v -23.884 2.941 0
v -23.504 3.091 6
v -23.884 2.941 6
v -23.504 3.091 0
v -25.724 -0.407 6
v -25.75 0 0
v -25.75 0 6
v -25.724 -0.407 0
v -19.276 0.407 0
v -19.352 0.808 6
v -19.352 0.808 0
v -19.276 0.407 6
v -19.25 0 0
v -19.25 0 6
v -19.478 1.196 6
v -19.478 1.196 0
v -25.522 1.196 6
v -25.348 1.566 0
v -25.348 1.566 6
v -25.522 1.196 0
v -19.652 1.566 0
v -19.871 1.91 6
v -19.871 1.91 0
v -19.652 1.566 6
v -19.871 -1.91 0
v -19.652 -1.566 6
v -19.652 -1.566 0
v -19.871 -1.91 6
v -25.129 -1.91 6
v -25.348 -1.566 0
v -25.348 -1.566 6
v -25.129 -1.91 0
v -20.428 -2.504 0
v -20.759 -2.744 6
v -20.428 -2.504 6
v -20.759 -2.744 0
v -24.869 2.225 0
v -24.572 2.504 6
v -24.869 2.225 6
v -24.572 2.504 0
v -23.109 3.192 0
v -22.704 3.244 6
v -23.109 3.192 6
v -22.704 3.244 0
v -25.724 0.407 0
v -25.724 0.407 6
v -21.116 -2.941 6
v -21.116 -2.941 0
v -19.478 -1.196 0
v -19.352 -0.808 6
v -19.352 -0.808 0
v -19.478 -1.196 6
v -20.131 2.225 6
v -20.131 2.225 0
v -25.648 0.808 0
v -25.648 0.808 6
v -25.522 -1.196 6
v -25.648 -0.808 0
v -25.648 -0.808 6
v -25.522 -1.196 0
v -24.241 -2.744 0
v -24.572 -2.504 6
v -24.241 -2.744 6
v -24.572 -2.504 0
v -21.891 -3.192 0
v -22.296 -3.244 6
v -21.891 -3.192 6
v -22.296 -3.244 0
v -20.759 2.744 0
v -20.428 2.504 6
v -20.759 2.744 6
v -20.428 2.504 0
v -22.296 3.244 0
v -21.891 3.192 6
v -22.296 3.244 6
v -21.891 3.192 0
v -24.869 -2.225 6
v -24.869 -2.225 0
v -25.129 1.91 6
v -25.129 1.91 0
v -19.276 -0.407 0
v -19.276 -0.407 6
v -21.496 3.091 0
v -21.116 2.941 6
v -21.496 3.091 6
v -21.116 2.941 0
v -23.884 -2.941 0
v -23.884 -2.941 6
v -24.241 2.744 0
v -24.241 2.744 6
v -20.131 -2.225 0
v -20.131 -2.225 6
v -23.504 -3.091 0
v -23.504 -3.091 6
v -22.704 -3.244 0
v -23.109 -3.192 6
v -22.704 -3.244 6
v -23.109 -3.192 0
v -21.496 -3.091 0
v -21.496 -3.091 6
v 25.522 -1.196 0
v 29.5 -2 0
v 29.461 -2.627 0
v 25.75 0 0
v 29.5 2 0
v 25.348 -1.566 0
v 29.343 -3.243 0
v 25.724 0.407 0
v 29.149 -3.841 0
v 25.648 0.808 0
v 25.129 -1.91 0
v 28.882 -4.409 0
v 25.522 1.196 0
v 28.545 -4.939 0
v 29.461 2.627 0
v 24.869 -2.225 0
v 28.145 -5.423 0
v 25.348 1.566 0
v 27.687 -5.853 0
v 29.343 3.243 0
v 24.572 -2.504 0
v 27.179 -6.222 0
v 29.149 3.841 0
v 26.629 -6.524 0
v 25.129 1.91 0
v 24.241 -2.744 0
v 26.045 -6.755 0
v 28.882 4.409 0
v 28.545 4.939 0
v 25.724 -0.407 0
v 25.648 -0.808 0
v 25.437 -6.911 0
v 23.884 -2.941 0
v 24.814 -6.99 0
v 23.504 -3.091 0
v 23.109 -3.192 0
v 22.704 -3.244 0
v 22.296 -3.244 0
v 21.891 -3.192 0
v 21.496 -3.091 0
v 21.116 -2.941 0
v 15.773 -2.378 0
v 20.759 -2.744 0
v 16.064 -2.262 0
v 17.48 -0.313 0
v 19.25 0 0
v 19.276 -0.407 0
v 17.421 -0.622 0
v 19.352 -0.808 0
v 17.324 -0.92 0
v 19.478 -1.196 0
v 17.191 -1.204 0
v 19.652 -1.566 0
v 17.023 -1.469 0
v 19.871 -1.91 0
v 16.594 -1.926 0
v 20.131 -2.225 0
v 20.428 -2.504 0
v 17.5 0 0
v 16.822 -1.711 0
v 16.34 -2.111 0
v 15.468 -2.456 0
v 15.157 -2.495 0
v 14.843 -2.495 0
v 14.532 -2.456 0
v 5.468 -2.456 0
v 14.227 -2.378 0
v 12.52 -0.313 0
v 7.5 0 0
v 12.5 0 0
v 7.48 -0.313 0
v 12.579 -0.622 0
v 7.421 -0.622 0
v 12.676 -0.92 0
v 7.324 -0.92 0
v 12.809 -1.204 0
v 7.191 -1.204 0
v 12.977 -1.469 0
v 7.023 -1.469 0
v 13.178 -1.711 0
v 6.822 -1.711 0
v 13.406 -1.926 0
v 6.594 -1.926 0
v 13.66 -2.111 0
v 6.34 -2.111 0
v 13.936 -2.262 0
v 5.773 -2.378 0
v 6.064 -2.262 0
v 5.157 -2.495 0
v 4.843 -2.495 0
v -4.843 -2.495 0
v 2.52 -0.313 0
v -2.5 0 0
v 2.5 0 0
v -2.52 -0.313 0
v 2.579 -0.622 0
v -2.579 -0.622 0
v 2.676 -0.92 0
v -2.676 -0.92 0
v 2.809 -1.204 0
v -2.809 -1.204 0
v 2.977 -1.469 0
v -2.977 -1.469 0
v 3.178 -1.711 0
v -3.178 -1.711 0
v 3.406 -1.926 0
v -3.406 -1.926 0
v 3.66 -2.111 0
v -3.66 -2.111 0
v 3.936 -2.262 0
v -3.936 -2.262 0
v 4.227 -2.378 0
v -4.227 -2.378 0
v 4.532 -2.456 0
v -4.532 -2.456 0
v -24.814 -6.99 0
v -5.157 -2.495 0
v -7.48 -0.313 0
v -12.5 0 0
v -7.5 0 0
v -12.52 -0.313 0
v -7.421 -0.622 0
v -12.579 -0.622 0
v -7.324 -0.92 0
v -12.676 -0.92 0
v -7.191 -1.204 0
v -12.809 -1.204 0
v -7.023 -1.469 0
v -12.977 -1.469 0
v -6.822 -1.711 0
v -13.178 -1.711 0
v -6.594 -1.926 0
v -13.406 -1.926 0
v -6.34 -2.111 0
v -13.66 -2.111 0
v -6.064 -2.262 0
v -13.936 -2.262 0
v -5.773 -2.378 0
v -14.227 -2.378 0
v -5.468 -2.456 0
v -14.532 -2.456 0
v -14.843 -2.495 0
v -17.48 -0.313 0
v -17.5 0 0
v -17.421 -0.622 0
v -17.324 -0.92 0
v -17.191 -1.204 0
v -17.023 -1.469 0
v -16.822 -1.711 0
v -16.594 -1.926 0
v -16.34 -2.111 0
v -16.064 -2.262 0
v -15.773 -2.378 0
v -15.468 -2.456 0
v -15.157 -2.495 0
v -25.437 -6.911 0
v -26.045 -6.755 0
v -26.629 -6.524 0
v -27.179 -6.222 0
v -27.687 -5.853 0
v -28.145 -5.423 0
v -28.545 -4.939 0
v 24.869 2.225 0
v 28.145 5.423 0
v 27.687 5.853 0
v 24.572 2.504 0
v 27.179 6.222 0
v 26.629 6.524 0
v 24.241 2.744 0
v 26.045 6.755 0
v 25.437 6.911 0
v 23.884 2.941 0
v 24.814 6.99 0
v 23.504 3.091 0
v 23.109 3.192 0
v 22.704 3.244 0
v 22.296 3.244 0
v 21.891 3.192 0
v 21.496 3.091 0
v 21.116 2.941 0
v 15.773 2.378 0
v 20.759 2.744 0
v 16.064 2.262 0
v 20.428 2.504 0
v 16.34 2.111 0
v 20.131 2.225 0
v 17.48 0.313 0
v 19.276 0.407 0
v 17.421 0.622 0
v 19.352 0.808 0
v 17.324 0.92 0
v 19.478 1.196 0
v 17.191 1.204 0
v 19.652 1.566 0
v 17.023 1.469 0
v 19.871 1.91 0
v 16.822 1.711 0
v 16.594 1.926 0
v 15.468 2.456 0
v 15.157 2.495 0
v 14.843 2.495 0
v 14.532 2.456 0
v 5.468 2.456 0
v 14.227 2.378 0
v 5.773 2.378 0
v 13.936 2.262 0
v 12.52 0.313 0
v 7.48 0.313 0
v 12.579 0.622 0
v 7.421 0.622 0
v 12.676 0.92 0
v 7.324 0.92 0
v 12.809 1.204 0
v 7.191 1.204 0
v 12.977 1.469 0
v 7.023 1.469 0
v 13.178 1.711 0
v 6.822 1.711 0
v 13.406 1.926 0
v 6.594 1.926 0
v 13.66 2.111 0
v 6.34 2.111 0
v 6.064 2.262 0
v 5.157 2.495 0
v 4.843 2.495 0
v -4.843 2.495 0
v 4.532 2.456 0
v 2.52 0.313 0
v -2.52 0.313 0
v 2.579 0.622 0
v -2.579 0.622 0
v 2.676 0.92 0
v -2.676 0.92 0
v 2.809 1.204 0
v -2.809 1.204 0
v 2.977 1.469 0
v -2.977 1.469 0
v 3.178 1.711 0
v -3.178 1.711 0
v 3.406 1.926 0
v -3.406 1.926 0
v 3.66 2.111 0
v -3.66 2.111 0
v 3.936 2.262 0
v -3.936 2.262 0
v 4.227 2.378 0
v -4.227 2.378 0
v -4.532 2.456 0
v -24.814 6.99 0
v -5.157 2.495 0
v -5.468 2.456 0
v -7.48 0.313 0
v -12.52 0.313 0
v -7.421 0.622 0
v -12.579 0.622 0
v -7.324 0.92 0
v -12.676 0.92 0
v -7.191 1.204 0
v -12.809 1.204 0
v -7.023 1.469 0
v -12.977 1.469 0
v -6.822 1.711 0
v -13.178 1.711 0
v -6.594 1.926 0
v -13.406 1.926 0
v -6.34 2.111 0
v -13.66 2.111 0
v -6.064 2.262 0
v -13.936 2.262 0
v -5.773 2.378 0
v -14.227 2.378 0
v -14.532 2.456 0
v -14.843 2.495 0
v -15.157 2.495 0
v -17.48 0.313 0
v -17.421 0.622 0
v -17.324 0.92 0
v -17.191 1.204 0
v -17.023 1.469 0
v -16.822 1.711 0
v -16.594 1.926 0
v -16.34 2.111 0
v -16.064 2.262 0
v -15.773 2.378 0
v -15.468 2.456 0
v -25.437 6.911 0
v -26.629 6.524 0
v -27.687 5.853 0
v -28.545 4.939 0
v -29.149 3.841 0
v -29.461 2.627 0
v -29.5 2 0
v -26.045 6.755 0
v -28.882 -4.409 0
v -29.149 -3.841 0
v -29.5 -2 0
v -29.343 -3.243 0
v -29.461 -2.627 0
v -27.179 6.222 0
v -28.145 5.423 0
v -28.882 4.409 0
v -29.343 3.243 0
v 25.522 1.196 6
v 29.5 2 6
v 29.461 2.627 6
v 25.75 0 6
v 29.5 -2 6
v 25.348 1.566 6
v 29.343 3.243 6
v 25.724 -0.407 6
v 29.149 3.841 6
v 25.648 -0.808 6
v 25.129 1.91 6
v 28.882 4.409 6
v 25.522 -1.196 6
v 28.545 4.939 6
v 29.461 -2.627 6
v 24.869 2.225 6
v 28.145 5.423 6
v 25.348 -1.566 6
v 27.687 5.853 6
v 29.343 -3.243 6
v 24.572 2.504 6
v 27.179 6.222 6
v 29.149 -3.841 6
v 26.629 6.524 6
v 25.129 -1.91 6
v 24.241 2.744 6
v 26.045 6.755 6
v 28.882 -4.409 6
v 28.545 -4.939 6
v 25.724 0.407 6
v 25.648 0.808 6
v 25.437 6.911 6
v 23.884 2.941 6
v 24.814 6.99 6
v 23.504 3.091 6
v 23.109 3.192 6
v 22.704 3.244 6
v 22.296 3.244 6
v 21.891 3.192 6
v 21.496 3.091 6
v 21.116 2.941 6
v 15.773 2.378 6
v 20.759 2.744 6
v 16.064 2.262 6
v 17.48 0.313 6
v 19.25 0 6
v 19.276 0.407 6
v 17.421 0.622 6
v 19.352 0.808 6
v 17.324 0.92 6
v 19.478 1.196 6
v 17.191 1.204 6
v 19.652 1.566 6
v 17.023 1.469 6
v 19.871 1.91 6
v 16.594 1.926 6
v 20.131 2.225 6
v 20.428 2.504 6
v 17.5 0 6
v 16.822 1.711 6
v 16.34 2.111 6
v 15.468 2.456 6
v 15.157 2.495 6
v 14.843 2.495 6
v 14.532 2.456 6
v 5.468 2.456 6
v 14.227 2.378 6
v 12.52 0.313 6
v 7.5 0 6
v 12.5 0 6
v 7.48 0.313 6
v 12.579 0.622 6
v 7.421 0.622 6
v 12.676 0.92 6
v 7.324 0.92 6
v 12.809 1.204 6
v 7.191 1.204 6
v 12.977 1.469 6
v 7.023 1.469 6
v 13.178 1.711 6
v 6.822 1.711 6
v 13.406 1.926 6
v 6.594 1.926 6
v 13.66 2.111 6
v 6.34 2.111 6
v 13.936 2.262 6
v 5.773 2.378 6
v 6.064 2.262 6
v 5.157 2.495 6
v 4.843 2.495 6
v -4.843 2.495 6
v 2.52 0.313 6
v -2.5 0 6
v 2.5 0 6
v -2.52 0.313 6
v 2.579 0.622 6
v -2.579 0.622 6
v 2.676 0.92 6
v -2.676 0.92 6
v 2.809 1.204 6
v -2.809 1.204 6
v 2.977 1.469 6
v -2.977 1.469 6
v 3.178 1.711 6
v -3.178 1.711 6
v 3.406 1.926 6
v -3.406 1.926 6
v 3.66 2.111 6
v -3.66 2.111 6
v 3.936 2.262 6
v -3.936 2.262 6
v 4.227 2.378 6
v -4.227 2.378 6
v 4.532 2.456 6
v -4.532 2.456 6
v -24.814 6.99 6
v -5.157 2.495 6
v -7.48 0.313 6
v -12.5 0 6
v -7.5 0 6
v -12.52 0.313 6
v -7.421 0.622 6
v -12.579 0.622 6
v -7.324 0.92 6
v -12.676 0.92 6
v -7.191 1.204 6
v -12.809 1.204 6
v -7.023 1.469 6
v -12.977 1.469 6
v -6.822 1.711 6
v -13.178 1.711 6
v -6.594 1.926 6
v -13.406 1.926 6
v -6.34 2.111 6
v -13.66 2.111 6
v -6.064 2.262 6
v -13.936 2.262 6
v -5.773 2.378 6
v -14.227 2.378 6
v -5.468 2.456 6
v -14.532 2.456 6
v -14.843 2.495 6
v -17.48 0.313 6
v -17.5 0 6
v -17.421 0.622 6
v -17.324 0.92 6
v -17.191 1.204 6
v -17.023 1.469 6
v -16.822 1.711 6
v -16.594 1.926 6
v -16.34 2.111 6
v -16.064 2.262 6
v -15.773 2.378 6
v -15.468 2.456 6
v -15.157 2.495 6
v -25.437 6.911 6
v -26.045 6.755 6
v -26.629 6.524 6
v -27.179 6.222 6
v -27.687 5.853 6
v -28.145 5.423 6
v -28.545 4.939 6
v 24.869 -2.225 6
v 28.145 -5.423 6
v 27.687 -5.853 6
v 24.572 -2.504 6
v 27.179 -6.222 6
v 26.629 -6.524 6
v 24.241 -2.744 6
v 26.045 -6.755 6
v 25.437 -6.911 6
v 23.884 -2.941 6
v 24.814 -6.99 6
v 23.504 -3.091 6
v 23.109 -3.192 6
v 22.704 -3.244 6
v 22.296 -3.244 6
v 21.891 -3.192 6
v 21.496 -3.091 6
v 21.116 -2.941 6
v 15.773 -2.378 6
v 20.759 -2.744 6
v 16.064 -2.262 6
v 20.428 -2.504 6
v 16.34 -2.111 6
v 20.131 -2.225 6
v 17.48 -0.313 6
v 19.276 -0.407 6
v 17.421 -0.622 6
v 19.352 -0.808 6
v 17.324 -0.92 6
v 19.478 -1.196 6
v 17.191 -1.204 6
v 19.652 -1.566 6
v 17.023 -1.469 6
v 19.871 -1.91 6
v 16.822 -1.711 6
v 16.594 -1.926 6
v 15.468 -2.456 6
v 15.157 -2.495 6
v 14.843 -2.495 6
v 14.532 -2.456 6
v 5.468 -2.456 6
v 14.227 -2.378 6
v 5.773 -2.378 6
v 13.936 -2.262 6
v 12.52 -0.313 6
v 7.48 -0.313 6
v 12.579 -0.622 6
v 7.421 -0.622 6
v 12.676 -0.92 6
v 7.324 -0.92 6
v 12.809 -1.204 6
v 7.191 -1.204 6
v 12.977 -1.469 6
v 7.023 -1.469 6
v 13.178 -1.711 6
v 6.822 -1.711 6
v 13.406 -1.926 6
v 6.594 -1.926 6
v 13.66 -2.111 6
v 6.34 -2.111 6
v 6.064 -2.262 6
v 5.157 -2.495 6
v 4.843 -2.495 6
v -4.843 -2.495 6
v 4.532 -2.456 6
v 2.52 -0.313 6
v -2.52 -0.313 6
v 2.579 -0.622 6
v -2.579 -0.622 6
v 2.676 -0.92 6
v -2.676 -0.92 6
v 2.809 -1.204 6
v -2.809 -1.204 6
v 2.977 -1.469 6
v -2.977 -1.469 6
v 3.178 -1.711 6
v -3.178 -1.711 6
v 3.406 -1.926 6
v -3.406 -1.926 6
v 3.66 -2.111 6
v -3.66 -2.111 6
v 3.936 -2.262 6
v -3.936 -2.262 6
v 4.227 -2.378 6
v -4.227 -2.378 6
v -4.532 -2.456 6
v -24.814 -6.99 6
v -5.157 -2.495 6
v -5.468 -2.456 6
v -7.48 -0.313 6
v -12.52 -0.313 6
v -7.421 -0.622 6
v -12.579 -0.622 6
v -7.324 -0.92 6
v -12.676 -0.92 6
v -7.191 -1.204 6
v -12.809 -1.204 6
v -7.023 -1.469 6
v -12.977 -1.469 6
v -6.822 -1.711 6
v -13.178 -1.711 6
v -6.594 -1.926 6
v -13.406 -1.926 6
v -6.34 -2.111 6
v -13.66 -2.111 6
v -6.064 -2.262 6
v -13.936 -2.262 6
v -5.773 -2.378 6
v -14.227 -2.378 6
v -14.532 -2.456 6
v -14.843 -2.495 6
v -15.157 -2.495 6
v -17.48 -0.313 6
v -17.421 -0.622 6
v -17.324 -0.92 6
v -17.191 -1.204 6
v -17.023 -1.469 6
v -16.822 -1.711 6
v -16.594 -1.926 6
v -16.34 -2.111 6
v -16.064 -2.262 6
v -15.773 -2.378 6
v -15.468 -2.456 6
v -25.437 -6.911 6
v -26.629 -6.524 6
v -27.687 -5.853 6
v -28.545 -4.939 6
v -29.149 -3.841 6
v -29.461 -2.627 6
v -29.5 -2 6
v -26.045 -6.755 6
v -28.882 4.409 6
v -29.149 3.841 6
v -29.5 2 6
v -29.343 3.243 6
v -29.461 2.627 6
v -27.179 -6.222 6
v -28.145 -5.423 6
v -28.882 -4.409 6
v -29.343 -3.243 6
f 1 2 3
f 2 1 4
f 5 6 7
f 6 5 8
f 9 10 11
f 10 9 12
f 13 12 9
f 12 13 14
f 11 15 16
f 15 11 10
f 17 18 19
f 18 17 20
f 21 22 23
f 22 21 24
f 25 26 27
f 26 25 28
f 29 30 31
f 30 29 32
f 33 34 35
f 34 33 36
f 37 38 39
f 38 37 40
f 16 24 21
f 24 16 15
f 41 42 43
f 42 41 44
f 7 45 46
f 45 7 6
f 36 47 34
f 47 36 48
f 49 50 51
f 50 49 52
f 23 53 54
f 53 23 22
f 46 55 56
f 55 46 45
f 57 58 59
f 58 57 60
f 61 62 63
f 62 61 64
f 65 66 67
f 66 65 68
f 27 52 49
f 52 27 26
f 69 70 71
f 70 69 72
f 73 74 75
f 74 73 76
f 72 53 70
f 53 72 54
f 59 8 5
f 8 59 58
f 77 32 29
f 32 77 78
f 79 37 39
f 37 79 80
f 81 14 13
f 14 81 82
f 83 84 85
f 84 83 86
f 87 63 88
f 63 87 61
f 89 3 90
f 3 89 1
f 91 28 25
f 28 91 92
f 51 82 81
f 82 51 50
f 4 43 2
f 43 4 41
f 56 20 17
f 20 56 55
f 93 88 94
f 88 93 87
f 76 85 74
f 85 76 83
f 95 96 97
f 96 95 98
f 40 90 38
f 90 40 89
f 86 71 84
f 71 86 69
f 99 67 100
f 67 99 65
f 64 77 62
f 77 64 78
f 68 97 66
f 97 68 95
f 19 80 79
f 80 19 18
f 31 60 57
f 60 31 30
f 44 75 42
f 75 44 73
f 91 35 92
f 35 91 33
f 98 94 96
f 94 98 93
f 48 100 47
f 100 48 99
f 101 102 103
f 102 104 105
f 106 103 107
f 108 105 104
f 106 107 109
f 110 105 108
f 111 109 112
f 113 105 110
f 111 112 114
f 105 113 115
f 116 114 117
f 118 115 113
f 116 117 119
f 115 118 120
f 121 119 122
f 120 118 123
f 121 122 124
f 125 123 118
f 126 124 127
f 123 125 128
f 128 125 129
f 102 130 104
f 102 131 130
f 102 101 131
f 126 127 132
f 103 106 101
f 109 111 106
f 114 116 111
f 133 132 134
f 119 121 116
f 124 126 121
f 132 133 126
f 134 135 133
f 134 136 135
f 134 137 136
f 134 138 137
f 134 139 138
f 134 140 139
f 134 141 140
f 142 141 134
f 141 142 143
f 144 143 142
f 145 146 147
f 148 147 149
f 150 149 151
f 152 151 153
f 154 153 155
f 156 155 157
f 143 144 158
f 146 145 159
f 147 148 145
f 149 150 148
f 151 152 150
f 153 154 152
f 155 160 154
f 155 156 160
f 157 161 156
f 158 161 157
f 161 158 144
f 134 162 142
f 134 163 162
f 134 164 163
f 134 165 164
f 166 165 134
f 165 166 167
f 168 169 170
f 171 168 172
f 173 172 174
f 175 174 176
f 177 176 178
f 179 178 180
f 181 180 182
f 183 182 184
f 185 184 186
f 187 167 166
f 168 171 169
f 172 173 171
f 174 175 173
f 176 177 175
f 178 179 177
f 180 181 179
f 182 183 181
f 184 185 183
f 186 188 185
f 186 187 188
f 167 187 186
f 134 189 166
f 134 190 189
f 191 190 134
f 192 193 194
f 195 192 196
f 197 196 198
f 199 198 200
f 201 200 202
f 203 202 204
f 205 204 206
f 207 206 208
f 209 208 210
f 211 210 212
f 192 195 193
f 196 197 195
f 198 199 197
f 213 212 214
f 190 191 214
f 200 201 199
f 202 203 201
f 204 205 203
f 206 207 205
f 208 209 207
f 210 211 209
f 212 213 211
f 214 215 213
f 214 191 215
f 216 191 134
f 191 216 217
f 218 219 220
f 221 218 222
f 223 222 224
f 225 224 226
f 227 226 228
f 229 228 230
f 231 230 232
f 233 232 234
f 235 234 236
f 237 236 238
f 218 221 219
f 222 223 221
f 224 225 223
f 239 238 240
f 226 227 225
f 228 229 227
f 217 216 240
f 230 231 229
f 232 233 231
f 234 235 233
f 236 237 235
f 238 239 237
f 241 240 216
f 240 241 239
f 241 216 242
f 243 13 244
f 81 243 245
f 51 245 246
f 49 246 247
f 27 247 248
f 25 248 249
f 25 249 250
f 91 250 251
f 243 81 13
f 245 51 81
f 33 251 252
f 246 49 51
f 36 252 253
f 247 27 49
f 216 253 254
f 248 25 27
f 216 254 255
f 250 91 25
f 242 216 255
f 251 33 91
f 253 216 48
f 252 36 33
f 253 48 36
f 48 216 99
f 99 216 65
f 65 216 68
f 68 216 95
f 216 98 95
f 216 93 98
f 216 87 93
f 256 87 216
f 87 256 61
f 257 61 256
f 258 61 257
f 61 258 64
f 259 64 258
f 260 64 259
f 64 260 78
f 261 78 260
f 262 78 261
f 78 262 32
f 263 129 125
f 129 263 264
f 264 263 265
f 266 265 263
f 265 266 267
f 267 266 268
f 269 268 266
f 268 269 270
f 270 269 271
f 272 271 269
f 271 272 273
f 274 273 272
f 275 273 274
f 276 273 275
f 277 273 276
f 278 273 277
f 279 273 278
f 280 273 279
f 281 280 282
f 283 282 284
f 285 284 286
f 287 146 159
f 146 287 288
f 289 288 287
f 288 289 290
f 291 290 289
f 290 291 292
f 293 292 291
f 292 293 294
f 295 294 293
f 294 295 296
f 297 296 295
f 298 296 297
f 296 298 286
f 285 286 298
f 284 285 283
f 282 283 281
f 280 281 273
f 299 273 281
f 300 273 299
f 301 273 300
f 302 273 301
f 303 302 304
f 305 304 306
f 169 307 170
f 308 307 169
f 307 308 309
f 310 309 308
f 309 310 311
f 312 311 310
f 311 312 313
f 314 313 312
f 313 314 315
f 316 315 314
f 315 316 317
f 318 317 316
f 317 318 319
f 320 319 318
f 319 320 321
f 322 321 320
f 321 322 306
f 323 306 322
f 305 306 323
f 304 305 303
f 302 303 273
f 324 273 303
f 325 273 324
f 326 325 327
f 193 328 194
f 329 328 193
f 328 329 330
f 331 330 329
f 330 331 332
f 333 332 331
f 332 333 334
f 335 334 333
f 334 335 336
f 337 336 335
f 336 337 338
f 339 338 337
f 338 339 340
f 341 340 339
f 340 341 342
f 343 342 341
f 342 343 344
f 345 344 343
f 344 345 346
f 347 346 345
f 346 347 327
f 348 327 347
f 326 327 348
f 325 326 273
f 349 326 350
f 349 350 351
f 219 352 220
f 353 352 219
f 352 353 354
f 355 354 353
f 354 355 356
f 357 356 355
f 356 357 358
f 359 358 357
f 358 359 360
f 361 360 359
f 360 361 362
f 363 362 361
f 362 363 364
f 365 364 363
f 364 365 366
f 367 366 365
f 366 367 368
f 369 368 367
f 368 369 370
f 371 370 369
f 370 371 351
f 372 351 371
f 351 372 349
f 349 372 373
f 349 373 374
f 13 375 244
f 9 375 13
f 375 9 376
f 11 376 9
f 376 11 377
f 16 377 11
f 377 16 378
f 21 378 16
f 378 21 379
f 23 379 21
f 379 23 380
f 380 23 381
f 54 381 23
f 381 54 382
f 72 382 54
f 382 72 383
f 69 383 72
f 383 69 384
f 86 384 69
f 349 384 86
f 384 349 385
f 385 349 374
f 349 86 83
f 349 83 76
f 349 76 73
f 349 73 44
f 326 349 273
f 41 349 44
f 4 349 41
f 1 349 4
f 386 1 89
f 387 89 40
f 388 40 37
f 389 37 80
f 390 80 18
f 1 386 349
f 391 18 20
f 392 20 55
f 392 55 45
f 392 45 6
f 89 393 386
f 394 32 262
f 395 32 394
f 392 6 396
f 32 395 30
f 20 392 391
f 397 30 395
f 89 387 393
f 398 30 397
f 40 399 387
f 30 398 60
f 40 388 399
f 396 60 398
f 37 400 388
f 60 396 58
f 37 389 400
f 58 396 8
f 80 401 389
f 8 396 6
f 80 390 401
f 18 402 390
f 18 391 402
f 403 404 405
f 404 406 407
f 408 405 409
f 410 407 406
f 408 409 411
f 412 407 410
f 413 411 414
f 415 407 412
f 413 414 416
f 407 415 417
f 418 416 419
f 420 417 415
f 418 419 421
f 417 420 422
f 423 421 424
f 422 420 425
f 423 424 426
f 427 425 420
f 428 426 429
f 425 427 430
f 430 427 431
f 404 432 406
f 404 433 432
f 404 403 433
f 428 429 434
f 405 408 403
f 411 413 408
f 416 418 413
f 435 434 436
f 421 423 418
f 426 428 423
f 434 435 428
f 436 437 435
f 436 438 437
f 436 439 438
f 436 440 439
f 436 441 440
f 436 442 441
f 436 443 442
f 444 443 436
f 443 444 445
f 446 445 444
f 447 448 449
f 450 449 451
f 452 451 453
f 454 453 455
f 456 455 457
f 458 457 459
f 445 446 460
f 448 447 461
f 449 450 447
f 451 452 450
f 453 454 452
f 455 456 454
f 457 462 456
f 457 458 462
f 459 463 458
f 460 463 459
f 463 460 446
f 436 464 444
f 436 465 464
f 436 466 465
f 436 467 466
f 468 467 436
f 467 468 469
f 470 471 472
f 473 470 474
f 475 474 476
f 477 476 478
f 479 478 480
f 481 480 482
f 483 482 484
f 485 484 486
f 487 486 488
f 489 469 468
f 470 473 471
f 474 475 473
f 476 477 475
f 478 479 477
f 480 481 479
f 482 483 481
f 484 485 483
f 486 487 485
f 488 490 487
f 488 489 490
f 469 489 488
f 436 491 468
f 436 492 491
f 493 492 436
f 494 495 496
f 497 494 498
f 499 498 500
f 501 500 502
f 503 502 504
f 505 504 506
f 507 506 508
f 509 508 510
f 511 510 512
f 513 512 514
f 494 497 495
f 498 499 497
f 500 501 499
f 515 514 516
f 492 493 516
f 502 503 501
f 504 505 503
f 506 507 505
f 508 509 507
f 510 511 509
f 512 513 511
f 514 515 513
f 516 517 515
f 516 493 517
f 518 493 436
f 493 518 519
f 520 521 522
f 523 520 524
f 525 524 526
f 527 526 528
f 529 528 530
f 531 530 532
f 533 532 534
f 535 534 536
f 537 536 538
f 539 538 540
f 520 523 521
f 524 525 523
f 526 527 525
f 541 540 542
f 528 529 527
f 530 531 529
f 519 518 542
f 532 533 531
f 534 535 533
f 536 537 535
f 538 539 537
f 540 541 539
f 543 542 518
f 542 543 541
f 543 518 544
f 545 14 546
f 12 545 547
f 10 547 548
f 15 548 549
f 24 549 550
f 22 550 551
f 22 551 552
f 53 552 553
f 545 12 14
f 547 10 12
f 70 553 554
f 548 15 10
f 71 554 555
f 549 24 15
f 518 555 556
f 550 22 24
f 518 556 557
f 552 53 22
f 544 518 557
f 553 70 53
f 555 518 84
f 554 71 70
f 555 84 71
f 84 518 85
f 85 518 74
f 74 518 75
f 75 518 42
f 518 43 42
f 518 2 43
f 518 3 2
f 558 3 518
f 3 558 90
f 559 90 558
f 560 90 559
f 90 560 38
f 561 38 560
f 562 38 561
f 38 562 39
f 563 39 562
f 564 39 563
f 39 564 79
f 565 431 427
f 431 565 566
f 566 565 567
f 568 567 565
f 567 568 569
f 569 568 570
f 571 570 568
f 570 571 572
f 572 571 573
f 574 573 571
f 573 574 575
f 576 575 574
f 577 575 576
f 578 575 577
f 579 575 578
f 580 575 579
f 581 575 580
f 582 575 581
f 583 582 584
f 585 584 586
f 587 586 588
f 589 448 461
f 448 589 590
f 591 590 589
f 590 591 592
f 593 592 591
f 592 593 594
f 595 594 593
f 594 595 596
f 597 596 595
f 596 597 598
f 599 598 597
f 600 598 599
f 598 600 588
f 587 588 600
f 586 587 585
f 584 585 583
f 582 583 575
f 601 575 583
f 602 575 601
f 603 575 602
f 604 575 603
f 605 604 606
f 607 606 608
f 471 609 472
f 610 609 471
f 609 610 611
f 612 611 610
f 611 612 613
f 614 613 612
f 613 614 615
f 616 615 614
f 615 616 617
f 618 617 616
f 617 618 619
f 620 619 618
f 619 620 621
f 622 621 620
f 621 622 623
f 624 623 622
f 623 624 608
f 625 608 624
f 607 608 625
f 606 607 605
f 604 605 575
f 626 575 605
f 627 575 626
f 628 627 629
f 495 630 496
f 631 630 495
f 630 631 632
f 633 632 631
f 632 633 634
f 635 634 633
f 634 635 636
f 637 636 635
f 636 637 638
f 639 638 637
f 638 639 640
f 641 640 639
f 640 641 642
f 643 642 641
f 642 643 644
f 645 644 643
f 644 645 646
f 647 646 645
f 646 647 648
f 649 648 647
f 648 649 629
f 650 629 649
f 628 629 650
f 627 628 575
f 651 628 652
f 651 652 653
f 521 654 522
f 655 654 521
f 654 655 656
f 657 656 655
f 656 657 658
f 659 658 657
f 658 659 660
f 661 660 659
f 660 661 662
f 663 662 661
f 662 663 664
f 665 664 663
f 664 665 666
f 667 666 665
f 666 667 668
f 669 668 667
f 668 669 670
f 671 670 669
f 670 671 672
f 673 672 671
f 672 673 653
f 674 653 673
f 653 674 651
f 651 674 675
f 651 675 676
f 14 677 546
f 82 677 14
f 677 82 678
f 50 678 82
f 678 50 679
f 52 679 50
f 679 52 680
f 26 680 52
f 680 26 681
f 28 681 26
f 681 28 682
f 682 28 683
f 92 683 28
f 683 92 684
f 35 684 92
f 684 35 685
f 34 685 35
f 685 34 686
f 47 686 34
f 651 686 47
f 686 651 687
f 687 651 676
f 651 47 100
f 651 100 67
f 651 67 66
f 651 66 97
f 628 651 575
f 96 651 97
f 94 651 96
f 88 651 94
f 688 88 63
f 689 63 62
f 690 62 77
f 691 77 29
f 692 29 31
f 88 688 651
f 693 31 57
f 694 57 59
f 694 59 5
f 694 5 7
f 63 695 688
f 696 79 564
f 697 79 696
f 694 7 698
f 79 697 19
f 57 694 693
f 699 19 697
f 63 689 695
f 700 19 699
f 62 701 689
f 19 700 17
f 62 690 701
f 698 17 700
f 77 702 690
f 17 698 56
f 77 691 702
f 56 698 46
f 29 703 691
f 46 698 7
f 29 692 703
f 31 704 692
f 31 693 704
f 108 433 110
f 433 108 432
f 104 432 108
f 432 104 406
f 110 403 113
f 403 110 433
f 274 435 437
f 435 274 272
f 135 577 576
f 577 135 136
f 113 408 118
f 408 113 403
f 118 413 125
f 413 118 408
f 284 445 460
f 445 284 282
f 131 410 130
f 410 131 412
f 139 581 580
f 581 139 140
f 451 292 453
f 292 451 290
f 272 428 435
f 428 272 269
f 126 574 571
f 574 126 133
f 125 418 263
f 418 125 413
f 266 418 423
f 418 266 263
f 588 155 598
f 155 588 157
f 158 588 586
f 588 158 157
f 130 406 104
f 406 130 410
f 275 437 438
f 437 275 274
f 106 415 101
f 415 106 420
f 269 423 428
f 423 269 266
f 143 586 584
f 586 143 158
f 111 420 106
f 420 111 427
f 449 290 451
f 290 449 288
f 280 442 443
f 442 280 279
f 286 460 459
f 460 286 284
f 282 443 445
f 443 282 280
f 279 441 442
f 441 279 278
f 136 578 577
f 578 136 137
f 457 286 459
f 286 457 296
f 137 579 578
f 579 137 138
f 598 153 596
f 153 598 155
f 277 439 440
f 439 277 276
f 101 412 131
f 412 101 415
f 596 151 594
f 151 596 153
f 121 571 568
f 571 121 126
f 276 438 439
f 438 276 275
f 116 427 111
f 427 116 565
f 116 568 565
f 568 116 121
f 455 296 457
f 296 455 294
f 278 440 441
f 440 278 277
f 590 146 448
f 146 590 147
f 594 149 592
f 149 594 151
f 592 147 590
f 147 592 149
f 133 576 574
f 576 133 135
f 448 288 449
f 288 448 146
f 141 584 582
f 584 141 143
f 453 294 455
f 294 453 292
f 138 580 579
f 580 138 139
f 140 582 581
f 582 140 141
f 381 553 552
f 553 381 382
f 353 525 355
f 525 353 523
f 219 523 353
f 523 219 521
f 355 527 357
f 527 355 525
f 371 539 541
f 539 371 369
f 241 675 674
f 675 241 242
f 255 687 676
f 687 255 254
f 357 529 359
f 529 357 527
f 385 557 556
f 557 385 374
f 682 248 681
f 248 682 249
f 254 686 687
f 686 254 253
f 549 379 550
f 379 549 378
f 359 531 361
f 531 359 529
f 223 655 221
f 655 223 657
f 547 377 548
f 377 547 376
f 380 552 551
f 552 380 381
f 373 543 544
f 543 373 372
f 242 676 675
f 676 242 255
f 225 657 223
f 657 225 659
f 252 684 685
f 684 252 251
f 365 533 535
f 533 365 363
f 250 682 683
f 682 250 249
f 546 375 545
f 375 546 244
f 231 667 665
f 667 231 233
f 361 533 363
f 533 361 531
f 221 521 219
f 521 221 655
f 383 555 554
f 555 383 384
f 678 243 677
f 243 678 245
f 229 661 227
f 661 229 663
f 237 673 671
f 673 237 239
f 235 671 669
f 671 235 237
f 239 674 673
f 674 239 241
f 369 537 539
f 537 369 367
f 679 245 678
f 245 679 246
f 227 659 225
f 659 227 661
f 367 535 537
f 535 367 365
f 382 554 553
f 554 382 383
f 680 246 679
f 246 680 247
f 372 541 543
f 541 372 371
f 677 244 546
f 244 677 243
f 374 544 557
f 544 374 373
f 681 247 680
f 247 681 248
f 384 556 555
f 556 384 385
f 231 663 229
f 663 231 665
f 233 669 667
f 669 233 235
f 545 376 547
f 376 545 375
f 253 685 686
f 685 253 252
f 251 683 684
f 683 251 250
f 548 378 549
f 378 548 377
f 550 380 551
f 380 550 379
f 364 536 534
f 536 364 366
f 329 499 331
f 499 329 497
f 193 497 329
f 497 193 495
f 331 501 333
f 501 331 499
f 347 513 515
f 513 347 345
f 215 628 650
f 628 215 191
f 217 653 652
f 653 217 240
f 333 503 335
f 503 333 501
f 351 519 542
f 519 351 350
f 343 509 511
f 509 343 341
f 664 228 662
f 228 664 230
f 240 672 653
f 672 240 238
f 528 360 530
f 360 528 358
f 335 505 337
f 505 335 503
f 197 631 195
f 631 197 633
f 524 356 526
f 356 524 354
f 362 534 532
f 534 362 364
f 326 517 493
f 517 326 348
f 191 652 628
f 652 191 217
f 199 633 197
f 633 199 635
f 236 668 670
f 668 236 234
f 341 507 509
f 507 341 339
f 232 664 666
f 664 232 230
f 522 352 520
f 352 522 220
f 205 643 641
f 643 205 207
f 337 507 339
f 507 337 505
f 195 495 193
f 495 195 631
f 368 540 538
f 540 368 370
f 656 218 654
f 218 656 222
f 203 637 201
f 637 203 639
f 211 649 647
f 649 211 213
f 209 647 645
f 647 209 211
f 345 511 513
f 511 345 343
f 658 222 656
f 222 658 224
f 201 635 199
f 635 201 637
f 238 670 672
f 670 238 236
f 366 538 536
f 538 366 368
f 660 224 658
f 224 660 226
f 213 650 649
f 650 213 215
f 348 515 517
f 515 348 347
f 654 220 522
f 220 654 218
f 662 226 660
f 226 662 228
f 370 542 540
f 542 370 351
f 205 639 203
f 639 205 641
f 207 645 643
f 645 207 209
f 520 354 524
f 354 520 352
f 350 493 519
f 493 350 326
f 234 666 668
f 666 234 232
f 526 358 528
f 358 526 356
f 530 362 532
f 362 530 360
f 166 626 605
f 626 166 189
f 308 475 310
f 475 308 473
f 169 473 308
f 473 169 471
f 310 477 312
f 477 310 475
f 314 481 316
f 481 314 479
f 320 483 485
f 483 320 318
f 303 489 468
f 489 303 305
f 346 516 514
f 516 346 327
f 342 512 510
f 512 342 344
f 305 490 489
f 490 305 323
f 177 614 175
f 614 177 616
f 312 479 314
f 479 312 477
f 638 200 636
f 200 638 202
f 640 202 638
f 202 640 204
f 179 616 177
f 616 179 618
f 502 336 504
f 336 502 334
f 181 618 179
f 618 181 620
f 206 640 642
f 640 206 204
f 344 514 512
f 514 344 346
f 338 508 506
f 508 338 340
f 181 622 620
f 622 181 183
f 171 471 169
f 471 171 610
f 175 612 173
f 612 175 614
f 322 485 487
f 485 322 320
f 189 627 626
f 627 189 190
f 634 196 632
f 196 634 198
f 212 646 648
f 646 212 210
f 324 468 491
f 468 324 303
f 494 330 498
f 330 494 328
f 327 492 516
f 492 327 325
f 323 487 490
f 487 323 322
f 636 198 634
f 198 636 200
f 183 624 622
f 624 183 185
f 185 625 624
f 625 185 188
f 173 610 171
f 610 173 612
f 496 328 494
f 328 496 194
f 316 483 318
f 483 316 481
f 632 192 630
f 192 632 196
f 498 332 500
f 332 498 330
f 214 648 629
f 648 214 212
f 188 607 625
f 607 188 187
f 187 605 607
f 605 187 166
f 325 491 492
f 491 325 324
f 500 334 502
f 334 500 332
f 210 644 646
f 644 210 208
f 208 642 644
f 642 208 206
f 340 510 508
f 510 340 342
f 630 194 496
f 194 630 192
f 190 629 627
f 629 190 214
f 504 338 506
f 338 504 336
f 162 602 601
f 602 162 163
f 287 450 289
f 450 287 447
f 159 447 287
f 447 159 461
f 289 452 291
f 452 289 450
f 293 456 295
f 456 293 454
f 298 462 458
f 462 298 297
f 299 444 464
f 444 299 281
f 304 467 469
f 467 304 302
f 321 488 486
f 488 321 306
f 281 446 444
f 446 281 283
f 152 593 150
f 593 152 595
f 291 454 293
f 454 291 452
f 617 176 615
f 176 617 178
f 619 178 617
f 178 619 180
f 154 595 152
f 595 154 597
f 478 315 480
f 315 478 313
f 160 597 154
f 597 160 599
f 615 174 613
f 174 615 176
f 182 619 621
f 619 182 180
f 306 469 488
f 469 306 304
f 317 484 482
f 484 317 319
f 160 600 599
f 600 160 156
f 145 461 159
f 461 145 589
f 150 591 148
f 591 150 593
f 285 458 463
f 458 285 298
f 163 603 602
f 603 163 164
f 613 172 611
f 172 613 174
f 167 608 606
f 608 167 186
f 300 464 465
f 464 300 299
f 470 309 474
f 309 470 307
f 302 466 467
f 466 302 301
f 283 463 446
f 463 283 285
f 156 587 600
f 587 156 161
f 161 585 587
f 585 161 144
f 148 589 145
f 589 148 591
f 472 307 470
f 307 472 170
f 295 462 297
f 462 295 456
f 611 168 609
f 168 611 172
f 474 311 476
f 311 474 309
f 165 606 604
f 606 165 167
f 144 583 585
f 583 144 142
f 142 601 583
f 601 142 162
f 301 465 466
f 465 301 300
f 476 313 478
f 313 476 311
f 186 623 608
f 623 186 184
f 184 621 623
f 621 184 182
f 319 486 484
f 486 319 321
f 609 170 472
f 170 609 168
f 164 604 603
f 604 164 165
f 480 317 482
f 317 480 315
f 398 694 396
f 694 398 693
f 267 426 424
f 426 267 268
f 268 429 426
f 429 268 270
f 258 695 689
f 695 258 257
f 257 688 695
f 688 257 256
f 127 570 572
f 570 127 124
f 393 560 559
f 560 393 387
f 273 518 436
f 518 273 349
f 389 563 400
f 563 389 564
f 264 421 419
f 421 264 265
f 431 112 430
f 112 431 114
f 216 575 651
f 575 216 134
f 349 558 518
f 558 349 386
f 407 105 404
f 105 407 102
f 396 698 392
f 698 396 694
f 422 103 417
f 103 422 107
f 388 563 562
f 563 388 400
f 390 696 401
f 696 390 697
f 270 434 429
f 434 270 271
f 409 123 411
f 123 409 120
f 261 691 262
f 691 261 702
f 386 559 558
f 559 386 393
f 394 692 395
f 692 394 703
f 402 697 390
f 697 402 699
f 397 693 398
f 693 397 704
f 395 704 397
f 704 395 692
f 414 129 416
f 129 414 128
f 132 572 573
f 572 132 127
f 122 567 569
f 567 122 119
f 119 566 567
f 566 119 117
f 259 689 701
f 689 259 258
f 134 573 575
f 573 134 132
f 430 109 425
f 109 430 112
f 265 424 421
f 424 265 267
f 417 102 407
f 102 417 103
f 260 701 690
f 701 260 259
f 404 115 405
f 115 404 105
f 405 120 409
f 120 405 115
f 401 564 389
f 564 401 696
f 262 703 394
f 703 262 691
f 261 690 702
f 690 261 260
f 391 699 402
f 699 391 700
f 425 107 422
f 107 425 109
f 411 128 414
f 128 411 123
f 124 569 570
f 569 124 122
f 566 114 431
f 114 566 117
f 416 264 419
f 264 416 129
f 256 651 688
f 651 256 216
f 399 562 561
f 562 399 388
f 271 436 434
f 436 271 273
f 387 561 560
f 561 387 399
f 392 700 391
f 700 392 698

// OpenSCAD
$fn = 50;

difference() {
	union() {
		hull() {
			translate(v = [-24.5, 2.0, 0]) {
				cylinder(h = 6, r = 5);
			}
			translate(v = [24.5, 2.0, 0]) {
				cylinder(h = 6, r = 5);
			}
			translate(v = [-24.5, -2.0, 0]) {
				cylinder(h = 6, r = 5);
			}
			translate(v = [24.5, -2.0, 0]) {
				cylinder(h = 6, r = 5);
			}
		}
	}
	union() {
		translate(v = [-22.5, 0.0, 0]) {
			cylinder(h = 6, r = 3.25);
		}
		translate(v = [22.5, 0.0, 0]) {
			cylinder(h = 6, r = 3.25);
		}
		translate(v = [-15.0, 0, 0.0]) {
			cylinder(h = 6, r = 2.5);
		}
		translate(v = [-5.0, 0, 0.0]) {
			cylinder(h = 6, r = 2.5);
		}
		translate(v = [5.0, 0, 0.0]) {
			cylinder(h = 6, r = 2.5);
		}
		translate(v = [15.0, 0, 0.0]) {
			cylinder(h = 6, r = 2.5);
		}
	}
}
